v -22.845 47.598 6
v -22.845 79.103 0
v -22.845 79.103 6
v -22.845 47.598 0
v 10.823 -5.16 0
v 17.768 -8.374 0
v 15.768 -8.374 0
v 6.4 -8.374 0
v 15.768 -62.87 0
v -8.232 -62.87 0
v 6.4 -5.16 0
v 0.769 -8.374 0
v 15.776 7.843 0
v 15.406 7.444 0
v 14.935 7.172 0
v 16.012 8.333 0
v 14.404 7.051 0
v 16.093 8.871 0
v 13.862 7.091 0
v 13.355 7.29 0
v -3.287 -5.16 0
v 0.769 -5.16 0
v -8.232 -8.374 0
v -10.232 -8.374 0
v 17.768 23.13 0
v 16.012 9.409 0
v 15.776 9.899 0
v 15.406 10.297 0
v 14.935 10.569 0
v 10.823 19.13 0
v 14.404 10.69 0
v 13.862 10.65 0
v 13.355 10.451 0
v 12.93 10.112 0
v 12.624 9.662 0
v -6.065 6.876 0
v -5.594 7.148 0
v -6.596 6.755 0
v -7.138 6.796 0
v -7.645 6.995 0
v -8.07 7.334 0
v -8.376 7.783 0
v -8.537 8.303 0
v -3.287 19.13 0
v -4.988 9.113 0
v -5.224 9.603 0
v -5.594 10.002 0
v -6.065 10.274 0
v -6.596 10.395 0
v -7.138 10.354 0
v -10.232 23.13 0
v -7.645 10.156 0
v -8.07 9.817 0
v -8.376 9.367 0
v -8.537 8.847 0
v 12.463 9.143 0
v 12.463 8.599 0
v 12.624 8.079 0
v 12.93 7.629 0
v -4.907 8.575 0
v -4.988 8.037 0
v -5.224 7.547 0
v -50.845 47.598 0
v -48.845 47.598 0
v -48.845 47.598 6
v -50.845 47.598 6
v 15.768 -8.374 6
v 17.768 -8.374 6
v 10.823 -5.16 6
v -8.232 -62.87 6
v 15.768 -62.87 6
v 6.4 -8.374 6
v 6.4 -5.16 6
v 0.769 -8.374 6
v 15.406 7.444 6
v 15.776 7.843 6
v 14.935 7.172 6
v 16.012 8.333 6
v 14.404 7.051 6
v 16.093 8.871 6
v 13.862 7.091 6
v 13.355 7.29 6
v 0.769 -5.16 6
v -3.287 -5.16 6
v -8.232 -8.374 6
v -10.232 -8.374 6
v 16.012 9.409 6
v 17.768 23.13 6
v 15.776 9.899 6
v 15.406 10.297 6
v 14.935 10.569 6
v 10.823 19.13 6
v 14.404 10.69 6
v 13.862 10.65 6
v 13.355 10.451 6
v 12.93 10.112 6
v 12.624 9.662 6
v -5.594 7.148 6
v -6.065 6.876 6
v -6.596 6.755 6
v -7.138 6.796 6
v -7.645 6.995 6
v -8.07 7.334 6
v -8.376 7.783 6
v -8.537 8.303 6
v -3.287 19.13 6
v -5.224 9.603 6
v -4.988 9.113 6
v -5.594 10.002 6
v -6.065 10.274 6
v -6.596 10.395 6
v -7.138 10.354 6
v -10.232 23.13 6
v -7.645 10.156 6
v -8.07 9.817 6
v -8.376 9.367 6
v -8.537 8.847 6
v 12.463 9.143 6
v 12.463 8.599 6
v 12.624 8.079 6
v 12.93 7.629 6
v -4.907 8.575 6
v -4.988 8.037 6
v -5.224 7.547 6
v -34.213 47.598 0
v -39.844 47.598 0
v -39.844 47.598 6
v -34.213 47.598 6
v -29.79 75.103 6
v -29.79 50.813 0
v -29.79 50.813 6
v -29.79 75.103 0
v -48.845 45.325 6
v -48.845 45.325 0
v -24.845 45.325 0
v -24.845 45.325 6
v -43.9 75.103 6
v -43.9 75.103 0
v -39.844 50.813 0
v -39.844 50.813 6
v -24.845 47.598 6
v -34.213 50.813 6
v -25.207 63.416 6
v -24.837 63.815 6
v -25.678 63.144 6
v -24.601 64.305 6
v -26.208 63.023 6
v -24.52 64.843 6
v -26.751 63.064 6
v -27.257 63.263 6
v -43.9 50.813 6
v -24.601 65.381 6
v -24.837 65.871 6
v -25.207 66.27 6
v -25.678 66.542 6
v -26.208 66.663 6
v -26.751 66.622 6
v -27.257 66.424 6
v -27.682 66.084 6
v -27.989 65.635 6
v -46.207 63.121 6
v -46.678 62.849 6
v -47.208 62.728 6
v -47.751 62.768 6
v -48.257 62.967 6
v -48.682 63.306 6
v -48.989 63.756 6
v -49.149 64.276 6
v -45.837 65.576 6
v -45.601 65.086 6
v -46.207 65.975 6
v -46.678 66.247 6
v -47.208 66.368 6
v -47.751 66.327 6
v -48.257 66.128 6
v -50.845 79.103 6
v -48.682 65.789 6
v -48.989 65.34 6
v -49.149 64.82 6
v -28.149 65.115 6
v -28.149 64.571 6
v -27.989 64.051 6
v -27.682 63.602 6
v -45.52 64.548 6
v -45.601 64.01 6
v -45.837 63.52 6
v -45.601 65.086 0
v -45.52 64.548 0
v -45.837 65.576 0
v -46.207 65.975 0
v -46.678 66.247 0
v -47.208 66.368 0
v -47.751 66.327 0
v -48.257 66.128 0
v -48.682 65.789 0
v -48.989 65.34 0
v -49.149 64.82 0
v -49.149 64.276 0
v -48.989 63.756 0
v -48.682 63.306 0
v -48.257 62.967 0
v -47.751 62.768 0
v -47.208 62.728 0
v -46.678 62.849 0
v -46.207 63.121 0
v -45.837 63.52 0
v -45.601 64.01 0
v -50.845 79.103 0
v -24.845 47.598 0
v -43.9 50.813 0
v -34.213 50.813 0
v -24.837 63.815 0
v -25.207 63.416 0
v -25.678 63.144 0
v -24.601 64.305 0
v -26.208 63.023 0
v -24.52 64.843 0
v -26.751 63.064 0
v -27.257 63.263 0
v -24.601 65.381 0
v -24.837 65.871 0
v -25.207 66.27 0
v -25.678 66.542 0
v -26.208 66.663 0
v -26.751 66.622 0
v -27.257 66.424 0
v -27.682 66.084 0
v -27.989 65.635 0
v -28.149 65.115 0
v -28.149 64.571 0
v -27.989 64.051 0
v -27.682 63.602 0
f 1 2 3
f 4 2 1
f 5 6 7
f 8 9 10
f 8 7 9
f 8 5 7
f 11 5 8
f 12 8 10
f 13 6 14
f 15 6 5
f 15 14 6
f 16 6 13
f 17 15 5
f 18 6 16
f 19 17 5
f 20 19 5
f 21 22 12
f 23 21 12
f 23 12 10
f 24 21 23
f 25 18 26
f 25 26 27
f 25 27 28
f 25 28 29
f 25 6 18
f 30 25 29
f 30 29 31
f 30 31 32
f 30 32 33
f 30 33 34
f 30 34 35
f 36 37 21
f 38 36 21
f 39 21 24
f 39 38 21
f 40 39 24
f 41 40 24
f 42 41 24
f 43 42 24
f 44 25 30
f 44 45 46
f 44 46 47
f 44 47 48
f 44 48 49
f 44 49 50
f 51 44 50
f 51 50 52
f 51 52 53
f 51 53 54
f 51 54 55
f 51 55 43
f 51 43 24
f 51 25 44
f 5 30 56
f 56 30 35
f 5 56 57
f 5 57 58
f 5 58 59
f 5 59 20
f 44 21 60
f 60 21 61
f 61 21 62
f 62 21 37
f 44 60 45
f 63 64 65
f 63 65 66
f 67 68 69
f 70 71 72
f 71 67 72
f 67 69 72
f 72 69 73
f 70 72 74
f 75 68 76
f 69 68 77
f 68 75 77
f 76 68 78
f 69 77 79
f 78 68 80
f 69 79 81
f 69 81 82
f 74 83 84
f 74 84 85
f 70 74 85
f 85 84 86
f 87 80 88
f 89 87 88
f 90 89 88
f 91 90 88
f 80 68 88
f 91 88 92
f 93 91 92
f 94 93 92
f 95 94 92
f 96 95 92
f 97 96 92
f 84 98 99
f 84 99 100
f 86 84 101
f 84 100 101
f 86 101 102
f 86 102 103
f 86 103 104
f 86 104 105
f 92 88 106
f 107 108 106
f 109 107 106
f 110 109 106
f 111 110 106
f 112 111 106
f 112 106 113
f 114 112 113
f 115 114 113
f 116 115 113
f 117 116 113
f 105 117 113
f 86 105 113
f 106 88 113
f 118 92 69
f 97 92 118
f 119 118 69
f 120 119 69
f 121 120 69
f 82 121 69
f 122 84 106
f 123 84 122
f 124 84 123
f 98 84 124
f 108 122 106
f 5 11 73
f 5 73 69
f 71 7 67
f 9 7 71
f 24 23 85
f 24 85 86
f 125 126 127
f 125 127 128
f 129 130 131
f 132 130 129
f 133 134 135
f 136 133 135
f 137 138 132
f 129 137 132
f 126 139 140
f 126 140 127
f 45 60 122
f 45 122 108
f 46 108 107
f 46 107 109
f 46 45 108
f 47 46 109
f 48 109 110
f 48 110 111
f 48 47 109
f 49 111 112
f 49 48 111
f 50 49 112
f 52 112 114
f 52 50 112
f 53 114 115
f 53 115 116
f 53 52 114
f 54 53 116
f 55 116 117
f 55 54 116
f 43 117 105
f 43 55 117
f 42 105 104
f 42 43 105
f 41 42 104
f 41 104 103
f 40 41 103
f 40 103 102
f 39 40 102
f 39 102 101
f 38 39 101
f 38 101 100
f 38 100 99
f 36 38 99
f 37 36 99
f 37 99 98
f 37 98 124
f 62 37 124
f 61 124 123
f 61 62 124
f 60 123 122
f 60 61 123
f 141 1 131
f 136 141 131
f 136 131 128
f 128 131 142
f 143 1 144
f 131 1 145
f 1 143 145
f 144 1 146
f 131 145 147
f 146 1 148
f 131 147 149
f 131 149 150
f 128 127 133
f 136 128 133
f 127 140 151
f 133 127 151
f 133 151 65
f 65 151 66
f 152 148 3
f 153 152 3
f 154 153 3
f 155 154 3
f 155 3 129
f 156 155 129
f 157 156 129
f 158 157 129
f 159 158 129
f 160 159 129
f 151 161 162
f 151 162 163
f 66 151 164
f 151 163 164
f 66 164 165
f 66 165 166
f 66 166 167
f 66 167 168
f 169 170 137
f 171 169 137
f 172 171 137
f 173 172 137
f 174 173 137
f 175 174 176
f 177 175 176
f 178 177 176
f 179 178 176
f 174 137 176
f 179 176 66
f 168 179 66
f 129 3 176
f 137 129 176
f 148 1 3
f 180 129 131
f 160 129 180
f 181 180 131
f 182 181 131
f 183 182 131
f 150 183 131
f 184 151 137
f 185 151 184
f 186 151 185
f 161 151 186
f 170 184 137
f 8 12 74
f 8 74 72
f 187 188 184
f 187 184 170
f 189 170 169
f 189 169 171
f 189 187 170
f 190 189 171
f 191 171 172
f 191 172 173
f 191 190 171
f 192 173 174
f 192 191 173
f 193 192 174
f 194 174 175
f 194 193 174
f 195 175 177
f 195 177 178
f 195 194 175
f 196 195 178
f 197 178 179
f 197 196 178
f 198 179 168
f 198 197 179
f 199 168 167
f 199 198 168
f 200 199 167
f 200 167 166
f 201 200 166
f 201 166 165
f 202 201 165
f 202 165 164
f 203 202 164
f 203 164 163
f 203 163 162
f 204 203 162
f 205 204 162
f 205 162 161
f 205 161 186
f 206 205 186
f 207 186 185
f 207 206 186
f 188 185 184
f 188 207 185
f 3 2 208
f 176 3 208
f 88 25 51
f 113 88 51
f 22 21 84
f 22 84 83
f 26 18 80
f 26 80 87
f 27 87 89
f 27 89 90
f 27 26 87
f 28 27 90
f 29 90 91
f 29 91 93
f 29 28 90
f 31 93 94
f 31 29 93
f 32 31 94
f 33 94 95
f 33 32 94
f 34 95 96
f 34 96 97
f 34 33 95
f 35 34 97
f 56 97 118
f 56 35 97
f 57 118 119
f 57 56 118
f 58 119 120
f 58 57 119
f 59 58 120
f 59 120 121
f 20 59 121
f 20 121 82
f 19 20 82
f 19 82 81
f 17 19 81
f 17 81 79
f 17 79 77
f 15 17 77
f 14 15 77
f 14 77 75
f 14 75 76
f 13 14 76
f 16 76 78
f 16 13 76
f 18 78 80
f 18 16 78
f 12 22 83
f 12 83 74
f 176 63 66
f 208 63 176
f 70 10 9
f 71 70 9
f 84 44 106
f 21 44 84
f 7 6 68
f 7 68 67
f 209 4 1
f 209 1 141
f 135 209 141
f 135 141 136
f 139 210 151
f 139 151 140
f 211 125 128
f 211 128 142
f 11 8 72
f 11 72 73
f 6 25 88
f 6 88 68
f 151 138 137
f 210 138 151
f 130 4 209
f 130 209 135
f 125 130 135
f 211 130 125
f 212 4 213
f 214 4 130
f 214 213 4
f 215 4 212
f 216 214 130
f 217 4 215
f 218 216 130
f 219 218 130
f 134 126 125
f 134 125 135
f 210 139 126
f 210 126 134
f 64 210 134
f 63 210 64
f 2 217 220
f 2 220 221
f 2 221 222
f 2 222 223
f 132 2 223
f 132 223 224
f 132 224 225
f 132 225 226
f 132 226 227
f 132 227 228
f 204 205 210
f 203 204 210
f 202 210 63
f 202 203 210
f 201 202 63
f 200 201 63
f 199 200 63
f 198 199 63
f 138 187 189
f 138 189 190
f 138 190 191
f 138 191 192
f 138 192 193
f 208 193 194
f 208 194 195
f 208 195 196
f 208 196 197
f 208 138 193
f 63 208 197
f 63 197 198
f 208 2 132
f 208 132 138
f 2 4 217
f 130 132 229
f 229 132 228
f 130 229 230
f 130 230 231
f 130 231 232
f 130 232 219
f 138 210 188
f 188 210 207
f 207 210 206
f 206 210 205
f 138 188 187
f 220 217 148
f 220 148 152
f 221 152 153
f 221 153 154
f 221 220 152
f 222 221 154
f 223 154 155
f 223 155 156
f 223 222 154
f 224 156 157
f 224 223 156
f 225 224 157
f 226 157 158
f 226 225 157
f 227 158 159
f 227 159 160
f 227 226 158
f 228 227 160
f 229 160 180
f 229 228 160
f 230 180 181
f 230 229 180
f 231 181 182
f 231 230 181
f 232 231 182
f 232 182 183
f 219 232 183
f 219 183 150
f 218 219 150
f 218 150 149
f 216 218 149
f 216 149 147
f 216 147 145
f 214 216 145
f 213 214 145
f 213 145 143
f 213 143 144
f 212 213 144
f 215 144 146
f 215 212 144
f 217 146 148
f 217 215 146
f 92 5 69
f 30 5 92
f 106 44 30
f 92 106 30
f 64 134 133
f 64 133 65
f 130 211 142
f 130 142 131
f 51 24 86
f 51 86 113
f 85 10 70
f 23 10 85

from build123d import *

# Parameters (mm, degrees)
SKETCH1_R           = 1.825
BOSS_EXTRUDE1_DEPTH = 6
SKETCH3_R           = 1.825
BOSS_EXTRUDE2_DEPTH = 6


with BuildPart() as part:
    # Sketch1 → Boss-Extrude1 (new body)
    with BuildSketch(Plane.XY):
        Polygon((3.767928447, -62.86956086), (-8.232071553, -62.86956086), (-8.232071553, -8.37428403), (-10.232071553, -8.37428403), (-10.232071553, 23.13043914), (-8.232071553, 23.13043914), (3.767928447, 23.13043914), (15.767928447, 23.13043914), (17.767928447, 23.13043914), (17.767928447, -8.37428403), (15.767928447, -8.37428403), (15.767928447, -62.86956086), align=None)
        with Locations((-6.732071553, 8.575211091)):
            Circle(SKETCH1_R, mode=Mode.SUBTRACT)
        with Locations((14.267928447, 8.870590402)):
            Circle(SKETCH1_R, mode=Mode.SUBTRACT)
        Polygon((3.767928447, 19.13043914), (-3.287071553, 19.13043914), (-3.287071553, -5.15956086), (0.76863058, -5.15956086), (0.76863058, -8.37428403), (6.399888712, -8.37428403), (6.399888712, -5.15956086), (10.822928447, -5.15956086), (10.822928447, 19.13043914), align=None, mode=Mode.SUBTRACT)
    extrude(amount=BOSS_EXTRUDE1_DEPTH)


with BuildPart() as body_2:
    # Sketch3 → Boss-Extrude2 (new body)
    with BuildSketch(Plane.XY):
        Polygon((-36.844661852, 45.324982103), (-48.844661852, 45.324982103), (-48.844661852, 47.59819619), (-50.844661852, 47.59819619), (-50.844661852, 79.10291936), (-48.844661852, 79.10291936), (-36.844661852, 79.10291936), (-24.844661852, 79.10291936), (-22.844661852, 79.10291936), (-22.844661852, 47.59819619), (-24.844661852, 47.59819619), (-24.844661852, 45.324982103), align=None)
        with Locations((-47.344661852, 64.547691311)):
            Circle(SKETCH3_R, mode=Mode.SUBTRACT)
        with Locations((-26.344661852, 64.843070622)):
            Circle(SKETCH3_R, mode=Mode.SUBTRACT)
        Polygon((-36.844661852, 75.10291936), (-43.899661852, 75.10291936), (-43.899661852, 50.81291936), (-39.843959719, 50.81291936), (-39.843959719, 47.59819619), (-34.212701587, 47.59819619), (-34.212701587, 50.81291936), (-29.789661852, 50.81291936), (-29.789661852, 75.10291936), align=None, mode=Mode.SUBTRACT)
    extrude(amount=BOSS_EXTRUDE2_DEPTH)


solid = Compound([part.part, body_2.part])
